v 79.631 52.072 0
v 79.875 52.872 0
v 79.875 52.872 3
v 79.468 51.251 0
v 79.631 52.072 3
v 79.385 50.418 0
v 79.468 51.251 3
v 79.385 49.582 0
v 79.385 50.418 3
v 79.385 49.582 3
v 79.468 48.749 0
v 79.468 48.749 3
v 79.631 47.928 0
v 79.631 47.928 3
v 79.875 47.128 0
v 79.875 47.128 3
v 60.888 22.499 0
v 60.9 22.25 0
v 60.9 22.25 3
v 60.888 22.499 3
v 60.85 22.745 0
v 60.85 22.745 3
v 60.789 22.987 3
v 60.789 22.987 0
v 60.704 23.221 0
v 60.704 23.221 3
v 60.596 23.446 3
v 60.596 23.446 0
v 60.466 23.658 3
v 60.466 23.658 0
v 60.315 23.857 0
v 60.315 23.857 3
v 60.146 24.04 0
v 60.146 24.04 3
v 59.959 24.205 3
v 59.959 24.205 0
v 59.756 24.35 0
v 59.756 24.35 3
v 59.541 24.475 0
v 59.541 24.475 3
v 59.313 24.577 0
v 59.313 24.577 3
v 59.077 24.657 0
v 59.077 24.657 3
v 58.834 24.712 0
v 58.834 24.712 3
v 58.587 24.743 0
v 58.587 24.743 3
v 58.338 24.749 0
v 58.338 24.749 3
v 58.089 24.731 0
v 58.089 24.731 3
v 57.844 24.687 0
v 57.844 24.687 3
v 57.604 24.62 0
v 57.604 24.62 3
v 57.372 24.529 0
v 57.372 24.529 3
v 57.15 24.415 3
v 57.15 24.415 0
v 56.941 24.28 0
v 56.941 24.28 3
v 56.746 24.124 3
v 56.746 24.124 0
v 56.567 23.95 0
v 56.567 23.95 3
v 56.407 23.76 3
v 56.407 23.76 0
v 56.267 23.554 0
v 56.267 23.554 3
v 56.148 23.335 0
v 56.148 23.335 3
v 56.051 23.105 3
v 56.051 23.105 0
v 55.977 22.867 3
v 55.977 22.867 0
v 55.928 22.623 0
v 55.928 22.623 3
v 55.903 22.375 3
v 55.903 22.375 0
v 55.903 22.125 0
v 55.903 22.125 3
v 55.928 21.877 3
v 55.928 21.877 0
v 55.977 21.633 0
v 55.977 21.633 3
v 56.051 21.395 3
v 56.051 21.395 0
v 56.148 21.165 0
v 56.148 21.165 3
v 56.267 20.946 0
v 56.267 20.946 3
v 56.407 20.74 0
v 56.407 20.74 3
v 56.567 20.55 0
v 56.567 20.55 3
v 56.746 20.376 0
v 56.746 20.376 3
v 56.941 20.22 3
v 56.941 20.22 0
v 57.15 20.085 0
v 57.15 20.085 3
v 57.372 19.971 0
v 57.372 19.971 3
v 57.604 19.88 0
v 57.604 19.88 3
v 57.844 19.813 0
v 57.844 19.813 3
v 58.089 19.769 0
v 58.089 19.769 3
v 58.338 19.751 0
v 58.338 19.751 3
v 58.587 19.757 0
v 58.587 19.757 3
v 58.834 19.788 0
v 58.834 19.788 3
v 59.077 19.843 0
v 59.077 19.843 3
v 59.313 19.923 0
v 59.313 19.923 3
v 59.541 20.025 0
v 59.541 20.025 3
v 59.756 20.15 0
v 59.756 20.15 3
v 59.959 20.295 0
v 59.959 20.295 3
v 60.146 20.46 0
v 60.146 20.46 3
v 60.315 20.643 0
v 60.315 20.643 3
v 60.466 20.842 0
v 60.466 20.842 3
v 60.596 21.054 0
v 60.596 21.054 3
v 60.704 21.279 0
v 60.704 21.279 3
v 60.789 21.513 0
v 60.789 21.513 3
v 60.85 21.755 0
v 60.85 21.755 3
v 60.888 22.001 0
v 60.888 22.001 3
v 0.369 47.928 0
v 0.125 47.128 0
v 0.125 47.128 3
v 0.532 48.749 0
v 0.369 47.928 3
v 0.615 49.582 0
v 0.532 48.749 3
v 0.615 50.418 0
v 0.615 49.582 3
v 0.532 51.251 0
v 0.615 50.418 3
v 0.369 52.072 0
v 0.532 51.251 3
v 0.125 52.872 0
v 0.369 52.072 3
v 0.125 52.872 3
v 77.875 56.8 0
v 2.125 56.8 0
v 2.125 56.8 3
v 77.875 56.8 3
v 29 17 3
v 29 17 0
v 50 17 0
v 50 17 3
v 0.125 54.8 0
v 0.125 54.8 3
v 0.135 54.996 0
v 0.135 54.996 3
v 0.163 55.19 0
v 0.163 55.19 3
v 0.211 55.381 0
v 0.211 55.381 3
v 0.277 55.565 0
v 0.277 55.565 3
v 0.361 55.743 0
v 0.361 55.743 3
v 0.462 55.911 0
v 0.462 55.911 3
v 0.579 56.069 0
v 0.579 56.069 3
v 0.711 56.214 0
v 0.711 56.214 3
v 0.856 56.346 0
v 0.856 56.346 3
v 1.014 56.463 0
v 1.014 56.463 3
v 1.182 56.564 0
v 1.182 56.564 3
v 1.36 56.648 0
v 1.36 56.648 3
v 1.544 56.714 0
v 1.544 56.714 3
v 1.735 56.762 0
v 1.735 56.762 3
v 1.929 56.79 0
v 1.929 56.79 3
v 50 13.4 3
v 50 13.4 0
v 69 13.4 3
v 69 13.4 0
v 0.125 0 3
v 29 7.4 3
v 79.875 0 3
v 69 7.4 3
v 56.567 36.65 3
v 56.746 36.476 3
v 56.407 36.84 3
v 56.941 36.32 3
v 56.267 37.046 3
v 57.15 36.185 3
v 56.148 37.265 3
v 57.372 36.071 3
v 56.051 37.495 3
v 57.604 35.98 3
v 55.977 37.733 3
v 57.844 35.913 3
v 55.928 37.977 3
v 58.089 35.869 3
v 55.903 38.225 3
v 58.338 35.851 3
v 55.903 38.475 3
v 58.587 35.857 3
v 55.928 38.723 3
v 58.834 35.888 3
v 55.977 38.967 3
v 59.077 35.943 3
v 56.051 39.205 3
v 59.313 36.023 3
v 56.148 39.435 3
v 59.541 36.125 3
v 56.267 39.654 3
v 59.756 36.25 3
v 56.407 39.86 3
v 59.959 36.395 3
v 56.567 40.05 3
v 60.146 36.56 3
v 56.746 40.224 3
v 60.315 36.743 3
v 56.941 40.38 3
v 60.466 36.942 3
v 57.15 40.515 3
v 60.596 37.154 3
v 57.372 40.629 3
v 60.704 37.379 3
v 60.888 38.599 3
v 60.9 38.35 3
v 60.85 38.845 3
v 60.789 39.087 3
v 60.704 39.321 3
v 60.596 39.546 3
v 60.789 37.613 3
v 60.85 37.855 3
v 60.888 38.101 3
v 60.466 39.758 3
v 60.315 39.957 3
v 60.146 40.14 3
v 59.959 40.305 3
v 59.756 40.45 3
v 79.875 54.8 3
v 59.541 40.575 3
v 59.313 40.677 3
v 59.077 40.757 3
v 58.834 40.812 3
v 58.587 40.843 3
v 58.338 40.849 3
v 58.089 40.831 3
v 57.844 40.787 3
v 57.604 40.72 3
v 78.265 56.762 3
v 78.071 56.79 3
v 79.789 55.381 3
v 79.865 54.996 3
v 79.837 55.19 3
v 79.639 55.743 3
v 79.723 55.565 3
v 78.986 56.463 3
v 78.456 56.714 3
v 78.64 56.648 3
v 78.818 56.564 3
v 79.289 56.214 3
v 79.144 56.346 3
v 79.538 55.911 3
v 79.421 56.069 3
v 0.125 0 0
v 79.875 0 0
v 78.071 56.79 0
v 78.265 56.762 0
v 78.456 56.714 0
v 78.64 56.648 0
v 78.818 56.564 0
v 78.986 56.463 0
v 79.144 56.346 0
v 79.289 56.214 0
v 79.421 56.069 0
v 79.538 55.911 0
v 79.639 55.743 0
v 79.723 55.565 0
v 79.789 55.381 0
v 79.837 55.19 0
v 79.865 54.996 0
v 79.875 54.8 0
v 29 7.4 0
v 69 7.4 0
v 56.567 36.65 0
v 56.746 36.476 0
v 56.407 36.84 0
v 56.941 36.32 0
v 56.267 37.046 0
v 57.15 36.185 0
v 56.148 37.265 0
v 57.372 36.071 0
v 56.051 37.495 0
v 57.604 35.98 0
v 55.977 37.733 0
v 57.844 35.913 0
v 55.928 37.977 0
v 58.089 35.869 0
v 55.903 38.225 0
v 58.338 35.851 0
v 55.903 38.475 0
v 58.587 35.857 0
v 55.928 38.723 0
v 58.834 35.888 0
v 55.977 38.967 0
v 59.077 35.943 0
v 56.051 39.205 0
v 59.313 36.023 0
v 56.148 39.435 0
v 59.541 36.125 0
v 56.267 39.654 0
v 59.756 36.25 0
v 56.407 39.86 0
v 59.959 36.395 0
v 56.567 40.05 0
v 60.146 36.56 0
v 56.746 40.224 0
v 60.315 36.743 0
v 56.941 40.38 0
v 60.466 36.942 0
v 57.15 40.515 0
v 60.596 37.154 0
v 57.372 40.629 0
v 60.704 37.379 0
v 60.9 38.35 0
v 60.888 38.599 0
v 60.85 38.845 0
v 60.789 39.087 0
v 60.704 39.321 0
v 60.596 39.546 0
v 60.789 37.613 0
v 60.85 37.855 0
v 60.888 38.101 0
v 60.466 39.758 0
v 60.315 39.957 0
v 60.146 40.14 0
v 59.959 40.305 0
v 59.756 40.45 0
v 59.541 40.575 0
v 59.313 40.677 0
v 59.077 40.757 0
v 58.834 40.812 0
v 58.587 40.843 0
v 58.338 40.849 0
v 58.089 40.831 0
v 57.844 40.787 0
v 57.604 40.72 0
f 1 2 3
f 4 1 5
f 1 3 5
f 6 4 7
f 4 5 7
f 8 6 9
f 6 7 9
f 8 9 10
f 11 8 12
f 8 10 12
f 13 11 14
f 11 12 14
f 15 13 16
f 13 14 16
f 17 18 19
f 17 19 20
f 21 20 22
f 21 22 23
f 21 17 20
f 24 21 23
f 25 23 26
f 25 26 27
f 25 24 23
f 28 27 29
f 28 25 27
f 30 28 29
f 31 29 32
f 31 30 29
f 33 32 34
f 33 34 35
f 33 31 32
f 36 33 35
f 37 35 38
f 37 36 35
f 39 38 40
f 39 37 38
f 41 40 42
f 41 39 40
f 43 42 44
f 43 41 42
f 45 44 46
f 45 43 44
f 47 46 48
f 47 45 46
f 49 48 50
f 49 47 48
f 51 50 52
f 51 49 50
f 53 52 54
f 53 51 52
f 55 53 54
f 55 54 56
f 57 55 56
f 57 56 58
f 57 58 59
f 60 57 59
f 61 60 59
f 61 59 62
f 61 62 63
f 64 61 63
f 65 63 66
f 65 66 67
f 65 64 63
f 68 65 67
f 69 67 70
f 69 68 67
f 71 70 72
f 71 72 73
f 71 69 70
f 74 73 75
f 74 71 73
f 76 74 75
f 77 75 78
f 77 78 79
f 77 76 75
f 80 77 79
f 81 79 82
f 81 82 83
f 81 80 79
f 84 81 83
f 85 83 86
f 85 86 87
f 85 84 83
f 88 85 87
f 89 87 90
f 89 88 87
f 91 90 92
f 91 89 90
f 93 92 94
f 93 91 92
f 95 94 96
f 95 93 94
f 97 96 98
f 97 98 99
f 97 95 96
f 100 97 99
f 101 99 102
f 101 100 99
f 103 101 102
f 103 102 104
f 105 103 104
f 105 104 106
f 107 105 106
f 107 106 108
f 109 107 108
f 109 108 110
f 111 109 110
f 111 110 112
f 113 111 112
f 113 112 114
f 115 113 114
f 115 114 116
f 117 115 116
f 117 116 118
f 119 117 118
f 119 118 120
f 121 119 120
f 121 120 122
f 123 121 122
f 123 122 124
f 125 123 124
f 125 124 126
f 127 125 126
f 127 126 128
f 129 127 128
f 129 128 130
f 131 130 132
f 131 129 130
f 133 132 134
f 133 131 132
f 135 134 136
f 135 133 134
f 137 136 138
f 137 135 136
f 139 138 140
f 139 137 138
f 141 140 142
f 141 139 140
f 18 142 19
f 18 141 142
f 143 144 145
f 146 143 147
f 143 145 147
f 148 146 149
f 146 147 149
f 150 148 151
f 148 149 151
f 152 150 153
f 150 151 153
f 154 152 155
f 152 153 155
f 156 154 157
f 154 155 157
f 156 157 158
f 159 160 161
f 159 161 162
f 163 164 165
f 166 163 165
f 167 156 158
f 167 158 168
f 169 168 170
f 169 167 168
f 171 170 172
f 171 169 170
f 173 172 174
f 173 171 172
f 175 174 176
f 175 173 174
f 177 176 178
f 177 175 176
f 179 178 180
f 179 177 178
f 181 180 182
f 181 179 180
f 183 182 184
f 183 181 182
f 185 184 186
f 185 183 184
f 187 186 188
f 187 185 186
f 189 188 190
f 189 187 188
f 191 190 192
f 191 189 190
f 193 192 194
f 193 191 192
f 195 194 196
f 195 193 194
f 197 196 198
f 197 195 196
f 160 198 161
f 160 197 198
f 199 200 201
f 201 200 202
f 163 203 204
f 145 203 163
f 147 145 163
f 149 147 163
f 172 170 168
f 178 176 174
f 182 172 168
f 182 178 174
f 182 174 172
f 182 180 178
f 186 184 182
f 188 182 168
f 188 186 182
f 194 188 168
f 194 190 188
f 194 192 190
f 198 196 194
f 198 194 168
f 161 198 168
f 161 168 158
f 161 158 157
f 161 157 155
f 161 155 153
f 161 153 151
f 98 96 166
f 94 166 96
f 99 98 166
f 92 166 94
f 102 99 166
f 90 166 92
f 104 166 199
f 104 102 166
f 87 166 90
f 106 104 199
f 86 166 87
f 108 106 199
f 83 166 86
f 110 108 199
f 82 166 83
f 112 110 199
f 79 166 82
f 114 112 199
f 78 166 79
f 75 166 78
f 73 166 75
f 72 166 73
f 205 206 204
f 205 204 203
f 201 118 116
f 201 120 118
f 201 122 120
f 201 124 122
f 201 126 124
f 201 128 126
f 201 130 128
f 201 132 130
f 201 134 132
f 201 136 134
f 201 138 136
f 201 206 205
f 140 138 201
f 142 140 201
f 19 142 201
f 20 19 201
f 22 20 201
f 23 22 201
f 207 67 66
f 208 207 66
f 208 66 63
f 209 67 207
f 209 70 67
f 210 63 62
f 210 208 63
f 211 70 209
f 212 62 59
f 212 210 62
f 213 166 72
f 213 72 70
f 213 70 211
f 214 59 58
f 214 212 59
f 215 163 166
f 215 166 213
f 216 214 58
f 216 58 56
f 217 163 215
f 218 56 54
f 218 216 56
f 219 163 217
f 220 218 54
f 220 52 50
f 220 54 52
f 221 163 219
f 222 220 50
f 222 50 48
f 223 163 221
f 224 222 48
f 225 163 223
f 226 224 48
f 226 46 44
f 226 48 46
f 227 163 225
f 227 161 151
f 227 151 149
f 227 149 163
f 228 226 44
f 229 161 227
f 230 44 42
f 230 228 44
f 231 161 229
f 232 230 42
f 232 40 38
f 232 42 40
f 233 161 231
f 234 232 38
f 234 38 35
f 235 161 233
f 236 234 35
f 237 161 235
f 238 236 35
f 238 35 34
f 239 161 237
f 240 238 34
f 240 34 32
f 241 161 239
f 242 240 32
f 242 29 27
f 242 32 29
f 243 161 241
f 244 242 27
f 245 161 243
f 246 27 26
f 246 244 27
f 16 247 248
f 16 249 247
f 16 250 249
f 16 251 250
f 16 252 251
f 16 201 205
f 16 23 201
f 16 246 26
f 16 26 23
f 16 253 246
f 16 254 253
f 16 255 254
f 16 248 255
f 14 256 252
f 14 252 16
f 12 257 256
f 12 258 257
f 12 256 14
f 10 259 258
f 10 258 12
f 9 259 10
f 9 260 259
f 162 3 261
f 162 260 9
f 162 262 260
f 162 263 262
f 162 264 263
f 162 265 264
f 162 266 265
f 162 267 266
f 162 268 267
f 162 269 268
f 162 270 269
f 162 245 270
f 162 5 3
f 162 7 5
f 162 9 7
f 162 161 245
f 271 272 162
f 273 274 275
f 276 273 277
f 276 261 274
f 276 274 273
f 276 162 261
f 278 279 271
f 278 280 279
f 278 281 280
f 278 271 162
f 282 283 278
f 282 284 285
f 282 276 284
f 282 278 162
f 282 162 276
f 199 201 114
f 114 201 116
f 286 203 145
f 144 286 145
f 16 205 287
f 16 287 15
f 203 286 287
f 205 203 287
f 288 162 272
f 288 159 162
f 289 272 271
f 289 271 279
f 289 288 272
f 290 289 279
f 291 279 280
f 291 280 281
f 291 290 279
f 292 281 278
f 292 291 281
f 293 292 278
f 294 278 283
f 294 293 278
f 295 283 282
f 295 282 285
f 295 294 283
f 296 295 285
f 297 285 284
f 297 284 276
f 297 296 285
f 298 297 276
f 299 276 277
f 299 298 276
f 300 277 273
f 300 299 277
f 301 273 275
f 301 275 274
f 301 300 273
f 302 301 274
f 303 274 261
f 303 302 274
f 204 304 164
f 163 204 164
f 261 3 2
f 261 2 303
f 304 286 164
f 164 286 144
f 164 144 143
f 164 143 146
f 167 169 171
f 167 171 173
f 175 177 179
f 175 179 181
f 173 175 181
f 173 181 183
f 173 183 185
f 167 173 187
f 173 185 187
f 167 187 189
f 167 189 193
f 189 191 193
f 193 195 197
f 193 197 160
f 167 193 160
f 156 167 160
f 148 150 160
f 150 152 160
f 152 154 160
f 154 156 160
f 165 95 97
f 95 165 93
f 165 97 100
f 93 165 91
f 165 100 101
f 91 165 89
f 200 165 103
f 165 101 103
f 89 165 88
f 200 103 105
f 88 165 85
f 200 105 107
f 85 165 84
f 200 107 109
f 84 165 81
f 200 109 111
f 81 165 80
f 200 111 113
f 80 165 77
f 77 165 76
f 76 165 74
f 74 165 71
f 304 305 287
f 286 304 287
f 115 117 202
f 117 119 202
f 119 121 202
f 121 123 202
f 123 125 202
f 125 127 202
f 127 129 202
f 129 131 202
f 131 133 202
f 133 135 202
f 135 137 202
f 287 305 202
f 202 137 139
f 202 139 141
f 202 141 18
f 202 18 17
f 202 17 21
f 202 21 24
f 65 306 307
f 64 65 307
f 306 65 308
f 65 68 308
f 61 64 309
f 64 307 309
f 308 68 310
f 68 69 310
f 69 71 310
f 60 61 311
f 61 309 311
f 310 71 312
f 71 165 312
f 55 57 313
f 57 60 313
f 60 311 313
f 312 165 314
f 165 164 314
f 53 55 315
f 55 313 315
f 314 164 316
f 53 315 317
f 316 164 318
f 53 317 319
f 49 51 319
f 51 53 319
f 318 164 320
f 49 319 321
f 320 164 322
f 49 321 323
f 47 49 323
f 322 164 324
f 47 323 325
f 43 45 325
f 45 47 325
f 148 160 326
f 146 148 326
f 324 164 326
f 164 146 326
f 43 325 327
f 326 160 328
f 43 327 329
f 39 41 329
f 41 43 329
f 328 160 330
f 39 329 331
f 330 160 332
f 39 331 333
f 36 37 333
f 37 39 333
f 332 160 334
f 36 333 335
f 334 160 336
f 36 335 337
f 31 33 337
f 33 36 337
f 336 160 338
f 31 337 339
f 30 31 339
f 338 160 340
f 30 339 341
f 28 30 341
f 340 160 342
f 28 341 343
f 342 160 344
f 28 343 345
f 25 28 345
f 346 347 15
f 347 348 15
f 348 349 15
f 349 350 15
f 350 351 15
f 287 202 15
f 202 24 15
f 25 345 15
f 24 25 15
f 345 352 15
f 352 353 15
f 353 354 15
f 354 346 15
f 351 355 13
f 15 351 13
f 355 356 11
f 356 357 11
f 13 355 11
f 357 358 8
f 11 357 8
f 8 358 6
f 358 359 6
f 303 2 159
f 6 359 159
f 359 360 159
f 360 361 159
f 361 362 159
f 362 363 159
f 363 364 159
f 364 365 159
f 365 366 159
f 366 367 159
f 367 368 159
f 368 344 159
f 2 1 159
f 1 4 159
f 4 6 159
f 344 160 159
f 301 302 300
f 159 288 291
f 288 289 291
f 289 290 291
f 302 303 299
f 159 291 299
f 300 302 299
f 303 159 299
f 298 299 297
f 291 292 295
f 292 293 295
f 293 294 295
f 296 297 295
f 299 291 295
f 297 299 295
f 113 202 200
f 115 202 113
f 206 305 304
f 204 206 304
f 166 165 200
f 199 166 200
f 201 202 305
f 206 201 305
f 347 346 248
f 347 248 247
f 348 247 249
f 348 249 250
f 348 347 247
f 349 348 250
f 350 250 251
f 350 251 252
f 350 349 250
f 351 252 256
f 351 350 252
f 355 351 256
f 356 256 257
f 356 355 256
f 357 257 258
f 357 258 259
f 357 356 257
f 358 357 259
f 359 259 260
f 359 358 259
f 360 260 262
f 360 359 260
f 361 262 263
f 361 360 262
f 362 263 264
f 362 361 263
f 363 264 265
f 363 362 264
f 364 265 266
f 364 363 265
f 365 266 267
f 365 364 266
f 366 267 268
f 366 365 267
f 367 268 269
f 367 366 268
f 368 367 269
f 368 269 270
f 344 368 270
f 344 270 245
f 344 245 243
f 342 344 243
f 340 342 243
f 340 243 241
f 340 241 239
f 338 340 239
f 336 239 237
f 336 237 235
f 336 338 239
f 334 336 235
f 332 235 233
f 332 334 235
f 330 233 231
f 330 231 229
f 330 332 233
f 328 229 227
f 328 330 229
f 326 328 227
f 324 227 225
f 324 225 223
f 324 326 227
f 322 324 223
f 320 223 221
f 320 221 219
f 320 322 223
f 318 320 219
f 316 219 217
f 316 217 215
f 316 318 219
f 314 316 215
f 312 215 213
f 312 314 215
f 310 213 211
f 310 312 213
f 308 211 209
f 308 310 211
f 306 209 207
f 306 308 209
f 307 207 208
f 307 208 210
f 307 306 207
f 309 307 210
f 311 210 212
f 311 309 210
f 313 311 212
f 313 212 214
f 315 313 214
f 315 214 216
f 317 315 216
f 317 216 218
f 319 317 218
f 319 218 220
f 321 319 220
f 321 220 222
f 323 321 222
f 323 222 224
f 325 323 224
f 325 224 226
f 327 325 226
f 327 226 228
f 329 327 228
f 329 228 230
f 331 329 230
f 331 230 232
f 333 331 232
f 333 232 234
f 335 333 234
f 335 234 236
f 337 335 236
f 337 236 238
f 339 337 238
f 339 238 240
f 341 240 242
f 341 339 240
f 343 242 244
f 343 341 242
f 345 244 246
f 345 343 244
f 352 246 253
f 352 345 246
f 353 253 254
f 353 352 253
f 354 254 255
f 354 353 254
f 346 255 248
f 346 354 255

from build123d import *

# Parameters (mm, degrees)
SKETCH2_W           = 80
SKETCH2_H           = 56.8
SKETCH2_R           = 2.5
BOSS_EXTRUDE1_DEPTH = 3
SKETCH4_W           = 0.125
SKETCH4_H           = 56.8
CUT_EXTRUDE2_DEPTH  = 99.159258351
SKETCH3_R           = 8.5
CUT_EXTRUDE1_DEPTH  = 99.057409842
FILLET1_R           = 2


with BuildPart() as part:
    # Sketch2 → Boss-Extrude1 (new body)
    with BuildSketch(Plane.XY):
        with Locations((40, 28.4)):
            Rectangle(SKETCH2_W, SKETCH2_H)
        with Locations((58.4, 38.35)):
            Circle(SKETCH2_R, mode=Mode.SUBTRACT)
        with Locations((58.4, 22.25)):
            Circle(SKETCH2_R, mode=Mode.SUBTRACT)
        Polygon((29, 7.4), (29, 17), (50, 17), (50, 13.4), (69, 13.4), (69, 7.4), align=None, mode=Mode.SUBTRACT)
    extrude(amount=BOSS_EXTRUDE1_DEPTH)

    # Sketch4 → Cut-Extrude2 (cut, through all)
    with BuildSketch(Plane.XY.offset(3)):
        with Locations((0.0625, 28.4)):
            Rectangle(SKETCH4_W, SKETCH4_H)
        with Locations((79.9375, 28.4)):
            Rectangle(SKETCH4_W, SKETCH4_H)
    extrude(amount=-CUT_EXTRUDE2_DEPTH, mode=Mode.SUBTRACT)

    # Sketch3 → Cut-Extrude1 (cut, through all)
    with BuildSketch(Plane.XY.offset(3)):
        with Locations((-7.875, 50)):
            Circle(SKETCH3_R)
        with Locations((87.875, 50)):
            Circle(SKETCH3_R)
    extrude(amount=-CUT_EXTRUDE1_DEPTH, mode=Mode.SUBTRACT)

    # Fillet1
    fillet1_edges = [part.edges().sort_by_distance(p)[0] for p in [
        (0.125, 56.8, 1.5),
        (79.875, 56.8, 1.5),
    ]]
    fillet(fillet1_edges, radius=FILLET1_R)


solid = part.part
